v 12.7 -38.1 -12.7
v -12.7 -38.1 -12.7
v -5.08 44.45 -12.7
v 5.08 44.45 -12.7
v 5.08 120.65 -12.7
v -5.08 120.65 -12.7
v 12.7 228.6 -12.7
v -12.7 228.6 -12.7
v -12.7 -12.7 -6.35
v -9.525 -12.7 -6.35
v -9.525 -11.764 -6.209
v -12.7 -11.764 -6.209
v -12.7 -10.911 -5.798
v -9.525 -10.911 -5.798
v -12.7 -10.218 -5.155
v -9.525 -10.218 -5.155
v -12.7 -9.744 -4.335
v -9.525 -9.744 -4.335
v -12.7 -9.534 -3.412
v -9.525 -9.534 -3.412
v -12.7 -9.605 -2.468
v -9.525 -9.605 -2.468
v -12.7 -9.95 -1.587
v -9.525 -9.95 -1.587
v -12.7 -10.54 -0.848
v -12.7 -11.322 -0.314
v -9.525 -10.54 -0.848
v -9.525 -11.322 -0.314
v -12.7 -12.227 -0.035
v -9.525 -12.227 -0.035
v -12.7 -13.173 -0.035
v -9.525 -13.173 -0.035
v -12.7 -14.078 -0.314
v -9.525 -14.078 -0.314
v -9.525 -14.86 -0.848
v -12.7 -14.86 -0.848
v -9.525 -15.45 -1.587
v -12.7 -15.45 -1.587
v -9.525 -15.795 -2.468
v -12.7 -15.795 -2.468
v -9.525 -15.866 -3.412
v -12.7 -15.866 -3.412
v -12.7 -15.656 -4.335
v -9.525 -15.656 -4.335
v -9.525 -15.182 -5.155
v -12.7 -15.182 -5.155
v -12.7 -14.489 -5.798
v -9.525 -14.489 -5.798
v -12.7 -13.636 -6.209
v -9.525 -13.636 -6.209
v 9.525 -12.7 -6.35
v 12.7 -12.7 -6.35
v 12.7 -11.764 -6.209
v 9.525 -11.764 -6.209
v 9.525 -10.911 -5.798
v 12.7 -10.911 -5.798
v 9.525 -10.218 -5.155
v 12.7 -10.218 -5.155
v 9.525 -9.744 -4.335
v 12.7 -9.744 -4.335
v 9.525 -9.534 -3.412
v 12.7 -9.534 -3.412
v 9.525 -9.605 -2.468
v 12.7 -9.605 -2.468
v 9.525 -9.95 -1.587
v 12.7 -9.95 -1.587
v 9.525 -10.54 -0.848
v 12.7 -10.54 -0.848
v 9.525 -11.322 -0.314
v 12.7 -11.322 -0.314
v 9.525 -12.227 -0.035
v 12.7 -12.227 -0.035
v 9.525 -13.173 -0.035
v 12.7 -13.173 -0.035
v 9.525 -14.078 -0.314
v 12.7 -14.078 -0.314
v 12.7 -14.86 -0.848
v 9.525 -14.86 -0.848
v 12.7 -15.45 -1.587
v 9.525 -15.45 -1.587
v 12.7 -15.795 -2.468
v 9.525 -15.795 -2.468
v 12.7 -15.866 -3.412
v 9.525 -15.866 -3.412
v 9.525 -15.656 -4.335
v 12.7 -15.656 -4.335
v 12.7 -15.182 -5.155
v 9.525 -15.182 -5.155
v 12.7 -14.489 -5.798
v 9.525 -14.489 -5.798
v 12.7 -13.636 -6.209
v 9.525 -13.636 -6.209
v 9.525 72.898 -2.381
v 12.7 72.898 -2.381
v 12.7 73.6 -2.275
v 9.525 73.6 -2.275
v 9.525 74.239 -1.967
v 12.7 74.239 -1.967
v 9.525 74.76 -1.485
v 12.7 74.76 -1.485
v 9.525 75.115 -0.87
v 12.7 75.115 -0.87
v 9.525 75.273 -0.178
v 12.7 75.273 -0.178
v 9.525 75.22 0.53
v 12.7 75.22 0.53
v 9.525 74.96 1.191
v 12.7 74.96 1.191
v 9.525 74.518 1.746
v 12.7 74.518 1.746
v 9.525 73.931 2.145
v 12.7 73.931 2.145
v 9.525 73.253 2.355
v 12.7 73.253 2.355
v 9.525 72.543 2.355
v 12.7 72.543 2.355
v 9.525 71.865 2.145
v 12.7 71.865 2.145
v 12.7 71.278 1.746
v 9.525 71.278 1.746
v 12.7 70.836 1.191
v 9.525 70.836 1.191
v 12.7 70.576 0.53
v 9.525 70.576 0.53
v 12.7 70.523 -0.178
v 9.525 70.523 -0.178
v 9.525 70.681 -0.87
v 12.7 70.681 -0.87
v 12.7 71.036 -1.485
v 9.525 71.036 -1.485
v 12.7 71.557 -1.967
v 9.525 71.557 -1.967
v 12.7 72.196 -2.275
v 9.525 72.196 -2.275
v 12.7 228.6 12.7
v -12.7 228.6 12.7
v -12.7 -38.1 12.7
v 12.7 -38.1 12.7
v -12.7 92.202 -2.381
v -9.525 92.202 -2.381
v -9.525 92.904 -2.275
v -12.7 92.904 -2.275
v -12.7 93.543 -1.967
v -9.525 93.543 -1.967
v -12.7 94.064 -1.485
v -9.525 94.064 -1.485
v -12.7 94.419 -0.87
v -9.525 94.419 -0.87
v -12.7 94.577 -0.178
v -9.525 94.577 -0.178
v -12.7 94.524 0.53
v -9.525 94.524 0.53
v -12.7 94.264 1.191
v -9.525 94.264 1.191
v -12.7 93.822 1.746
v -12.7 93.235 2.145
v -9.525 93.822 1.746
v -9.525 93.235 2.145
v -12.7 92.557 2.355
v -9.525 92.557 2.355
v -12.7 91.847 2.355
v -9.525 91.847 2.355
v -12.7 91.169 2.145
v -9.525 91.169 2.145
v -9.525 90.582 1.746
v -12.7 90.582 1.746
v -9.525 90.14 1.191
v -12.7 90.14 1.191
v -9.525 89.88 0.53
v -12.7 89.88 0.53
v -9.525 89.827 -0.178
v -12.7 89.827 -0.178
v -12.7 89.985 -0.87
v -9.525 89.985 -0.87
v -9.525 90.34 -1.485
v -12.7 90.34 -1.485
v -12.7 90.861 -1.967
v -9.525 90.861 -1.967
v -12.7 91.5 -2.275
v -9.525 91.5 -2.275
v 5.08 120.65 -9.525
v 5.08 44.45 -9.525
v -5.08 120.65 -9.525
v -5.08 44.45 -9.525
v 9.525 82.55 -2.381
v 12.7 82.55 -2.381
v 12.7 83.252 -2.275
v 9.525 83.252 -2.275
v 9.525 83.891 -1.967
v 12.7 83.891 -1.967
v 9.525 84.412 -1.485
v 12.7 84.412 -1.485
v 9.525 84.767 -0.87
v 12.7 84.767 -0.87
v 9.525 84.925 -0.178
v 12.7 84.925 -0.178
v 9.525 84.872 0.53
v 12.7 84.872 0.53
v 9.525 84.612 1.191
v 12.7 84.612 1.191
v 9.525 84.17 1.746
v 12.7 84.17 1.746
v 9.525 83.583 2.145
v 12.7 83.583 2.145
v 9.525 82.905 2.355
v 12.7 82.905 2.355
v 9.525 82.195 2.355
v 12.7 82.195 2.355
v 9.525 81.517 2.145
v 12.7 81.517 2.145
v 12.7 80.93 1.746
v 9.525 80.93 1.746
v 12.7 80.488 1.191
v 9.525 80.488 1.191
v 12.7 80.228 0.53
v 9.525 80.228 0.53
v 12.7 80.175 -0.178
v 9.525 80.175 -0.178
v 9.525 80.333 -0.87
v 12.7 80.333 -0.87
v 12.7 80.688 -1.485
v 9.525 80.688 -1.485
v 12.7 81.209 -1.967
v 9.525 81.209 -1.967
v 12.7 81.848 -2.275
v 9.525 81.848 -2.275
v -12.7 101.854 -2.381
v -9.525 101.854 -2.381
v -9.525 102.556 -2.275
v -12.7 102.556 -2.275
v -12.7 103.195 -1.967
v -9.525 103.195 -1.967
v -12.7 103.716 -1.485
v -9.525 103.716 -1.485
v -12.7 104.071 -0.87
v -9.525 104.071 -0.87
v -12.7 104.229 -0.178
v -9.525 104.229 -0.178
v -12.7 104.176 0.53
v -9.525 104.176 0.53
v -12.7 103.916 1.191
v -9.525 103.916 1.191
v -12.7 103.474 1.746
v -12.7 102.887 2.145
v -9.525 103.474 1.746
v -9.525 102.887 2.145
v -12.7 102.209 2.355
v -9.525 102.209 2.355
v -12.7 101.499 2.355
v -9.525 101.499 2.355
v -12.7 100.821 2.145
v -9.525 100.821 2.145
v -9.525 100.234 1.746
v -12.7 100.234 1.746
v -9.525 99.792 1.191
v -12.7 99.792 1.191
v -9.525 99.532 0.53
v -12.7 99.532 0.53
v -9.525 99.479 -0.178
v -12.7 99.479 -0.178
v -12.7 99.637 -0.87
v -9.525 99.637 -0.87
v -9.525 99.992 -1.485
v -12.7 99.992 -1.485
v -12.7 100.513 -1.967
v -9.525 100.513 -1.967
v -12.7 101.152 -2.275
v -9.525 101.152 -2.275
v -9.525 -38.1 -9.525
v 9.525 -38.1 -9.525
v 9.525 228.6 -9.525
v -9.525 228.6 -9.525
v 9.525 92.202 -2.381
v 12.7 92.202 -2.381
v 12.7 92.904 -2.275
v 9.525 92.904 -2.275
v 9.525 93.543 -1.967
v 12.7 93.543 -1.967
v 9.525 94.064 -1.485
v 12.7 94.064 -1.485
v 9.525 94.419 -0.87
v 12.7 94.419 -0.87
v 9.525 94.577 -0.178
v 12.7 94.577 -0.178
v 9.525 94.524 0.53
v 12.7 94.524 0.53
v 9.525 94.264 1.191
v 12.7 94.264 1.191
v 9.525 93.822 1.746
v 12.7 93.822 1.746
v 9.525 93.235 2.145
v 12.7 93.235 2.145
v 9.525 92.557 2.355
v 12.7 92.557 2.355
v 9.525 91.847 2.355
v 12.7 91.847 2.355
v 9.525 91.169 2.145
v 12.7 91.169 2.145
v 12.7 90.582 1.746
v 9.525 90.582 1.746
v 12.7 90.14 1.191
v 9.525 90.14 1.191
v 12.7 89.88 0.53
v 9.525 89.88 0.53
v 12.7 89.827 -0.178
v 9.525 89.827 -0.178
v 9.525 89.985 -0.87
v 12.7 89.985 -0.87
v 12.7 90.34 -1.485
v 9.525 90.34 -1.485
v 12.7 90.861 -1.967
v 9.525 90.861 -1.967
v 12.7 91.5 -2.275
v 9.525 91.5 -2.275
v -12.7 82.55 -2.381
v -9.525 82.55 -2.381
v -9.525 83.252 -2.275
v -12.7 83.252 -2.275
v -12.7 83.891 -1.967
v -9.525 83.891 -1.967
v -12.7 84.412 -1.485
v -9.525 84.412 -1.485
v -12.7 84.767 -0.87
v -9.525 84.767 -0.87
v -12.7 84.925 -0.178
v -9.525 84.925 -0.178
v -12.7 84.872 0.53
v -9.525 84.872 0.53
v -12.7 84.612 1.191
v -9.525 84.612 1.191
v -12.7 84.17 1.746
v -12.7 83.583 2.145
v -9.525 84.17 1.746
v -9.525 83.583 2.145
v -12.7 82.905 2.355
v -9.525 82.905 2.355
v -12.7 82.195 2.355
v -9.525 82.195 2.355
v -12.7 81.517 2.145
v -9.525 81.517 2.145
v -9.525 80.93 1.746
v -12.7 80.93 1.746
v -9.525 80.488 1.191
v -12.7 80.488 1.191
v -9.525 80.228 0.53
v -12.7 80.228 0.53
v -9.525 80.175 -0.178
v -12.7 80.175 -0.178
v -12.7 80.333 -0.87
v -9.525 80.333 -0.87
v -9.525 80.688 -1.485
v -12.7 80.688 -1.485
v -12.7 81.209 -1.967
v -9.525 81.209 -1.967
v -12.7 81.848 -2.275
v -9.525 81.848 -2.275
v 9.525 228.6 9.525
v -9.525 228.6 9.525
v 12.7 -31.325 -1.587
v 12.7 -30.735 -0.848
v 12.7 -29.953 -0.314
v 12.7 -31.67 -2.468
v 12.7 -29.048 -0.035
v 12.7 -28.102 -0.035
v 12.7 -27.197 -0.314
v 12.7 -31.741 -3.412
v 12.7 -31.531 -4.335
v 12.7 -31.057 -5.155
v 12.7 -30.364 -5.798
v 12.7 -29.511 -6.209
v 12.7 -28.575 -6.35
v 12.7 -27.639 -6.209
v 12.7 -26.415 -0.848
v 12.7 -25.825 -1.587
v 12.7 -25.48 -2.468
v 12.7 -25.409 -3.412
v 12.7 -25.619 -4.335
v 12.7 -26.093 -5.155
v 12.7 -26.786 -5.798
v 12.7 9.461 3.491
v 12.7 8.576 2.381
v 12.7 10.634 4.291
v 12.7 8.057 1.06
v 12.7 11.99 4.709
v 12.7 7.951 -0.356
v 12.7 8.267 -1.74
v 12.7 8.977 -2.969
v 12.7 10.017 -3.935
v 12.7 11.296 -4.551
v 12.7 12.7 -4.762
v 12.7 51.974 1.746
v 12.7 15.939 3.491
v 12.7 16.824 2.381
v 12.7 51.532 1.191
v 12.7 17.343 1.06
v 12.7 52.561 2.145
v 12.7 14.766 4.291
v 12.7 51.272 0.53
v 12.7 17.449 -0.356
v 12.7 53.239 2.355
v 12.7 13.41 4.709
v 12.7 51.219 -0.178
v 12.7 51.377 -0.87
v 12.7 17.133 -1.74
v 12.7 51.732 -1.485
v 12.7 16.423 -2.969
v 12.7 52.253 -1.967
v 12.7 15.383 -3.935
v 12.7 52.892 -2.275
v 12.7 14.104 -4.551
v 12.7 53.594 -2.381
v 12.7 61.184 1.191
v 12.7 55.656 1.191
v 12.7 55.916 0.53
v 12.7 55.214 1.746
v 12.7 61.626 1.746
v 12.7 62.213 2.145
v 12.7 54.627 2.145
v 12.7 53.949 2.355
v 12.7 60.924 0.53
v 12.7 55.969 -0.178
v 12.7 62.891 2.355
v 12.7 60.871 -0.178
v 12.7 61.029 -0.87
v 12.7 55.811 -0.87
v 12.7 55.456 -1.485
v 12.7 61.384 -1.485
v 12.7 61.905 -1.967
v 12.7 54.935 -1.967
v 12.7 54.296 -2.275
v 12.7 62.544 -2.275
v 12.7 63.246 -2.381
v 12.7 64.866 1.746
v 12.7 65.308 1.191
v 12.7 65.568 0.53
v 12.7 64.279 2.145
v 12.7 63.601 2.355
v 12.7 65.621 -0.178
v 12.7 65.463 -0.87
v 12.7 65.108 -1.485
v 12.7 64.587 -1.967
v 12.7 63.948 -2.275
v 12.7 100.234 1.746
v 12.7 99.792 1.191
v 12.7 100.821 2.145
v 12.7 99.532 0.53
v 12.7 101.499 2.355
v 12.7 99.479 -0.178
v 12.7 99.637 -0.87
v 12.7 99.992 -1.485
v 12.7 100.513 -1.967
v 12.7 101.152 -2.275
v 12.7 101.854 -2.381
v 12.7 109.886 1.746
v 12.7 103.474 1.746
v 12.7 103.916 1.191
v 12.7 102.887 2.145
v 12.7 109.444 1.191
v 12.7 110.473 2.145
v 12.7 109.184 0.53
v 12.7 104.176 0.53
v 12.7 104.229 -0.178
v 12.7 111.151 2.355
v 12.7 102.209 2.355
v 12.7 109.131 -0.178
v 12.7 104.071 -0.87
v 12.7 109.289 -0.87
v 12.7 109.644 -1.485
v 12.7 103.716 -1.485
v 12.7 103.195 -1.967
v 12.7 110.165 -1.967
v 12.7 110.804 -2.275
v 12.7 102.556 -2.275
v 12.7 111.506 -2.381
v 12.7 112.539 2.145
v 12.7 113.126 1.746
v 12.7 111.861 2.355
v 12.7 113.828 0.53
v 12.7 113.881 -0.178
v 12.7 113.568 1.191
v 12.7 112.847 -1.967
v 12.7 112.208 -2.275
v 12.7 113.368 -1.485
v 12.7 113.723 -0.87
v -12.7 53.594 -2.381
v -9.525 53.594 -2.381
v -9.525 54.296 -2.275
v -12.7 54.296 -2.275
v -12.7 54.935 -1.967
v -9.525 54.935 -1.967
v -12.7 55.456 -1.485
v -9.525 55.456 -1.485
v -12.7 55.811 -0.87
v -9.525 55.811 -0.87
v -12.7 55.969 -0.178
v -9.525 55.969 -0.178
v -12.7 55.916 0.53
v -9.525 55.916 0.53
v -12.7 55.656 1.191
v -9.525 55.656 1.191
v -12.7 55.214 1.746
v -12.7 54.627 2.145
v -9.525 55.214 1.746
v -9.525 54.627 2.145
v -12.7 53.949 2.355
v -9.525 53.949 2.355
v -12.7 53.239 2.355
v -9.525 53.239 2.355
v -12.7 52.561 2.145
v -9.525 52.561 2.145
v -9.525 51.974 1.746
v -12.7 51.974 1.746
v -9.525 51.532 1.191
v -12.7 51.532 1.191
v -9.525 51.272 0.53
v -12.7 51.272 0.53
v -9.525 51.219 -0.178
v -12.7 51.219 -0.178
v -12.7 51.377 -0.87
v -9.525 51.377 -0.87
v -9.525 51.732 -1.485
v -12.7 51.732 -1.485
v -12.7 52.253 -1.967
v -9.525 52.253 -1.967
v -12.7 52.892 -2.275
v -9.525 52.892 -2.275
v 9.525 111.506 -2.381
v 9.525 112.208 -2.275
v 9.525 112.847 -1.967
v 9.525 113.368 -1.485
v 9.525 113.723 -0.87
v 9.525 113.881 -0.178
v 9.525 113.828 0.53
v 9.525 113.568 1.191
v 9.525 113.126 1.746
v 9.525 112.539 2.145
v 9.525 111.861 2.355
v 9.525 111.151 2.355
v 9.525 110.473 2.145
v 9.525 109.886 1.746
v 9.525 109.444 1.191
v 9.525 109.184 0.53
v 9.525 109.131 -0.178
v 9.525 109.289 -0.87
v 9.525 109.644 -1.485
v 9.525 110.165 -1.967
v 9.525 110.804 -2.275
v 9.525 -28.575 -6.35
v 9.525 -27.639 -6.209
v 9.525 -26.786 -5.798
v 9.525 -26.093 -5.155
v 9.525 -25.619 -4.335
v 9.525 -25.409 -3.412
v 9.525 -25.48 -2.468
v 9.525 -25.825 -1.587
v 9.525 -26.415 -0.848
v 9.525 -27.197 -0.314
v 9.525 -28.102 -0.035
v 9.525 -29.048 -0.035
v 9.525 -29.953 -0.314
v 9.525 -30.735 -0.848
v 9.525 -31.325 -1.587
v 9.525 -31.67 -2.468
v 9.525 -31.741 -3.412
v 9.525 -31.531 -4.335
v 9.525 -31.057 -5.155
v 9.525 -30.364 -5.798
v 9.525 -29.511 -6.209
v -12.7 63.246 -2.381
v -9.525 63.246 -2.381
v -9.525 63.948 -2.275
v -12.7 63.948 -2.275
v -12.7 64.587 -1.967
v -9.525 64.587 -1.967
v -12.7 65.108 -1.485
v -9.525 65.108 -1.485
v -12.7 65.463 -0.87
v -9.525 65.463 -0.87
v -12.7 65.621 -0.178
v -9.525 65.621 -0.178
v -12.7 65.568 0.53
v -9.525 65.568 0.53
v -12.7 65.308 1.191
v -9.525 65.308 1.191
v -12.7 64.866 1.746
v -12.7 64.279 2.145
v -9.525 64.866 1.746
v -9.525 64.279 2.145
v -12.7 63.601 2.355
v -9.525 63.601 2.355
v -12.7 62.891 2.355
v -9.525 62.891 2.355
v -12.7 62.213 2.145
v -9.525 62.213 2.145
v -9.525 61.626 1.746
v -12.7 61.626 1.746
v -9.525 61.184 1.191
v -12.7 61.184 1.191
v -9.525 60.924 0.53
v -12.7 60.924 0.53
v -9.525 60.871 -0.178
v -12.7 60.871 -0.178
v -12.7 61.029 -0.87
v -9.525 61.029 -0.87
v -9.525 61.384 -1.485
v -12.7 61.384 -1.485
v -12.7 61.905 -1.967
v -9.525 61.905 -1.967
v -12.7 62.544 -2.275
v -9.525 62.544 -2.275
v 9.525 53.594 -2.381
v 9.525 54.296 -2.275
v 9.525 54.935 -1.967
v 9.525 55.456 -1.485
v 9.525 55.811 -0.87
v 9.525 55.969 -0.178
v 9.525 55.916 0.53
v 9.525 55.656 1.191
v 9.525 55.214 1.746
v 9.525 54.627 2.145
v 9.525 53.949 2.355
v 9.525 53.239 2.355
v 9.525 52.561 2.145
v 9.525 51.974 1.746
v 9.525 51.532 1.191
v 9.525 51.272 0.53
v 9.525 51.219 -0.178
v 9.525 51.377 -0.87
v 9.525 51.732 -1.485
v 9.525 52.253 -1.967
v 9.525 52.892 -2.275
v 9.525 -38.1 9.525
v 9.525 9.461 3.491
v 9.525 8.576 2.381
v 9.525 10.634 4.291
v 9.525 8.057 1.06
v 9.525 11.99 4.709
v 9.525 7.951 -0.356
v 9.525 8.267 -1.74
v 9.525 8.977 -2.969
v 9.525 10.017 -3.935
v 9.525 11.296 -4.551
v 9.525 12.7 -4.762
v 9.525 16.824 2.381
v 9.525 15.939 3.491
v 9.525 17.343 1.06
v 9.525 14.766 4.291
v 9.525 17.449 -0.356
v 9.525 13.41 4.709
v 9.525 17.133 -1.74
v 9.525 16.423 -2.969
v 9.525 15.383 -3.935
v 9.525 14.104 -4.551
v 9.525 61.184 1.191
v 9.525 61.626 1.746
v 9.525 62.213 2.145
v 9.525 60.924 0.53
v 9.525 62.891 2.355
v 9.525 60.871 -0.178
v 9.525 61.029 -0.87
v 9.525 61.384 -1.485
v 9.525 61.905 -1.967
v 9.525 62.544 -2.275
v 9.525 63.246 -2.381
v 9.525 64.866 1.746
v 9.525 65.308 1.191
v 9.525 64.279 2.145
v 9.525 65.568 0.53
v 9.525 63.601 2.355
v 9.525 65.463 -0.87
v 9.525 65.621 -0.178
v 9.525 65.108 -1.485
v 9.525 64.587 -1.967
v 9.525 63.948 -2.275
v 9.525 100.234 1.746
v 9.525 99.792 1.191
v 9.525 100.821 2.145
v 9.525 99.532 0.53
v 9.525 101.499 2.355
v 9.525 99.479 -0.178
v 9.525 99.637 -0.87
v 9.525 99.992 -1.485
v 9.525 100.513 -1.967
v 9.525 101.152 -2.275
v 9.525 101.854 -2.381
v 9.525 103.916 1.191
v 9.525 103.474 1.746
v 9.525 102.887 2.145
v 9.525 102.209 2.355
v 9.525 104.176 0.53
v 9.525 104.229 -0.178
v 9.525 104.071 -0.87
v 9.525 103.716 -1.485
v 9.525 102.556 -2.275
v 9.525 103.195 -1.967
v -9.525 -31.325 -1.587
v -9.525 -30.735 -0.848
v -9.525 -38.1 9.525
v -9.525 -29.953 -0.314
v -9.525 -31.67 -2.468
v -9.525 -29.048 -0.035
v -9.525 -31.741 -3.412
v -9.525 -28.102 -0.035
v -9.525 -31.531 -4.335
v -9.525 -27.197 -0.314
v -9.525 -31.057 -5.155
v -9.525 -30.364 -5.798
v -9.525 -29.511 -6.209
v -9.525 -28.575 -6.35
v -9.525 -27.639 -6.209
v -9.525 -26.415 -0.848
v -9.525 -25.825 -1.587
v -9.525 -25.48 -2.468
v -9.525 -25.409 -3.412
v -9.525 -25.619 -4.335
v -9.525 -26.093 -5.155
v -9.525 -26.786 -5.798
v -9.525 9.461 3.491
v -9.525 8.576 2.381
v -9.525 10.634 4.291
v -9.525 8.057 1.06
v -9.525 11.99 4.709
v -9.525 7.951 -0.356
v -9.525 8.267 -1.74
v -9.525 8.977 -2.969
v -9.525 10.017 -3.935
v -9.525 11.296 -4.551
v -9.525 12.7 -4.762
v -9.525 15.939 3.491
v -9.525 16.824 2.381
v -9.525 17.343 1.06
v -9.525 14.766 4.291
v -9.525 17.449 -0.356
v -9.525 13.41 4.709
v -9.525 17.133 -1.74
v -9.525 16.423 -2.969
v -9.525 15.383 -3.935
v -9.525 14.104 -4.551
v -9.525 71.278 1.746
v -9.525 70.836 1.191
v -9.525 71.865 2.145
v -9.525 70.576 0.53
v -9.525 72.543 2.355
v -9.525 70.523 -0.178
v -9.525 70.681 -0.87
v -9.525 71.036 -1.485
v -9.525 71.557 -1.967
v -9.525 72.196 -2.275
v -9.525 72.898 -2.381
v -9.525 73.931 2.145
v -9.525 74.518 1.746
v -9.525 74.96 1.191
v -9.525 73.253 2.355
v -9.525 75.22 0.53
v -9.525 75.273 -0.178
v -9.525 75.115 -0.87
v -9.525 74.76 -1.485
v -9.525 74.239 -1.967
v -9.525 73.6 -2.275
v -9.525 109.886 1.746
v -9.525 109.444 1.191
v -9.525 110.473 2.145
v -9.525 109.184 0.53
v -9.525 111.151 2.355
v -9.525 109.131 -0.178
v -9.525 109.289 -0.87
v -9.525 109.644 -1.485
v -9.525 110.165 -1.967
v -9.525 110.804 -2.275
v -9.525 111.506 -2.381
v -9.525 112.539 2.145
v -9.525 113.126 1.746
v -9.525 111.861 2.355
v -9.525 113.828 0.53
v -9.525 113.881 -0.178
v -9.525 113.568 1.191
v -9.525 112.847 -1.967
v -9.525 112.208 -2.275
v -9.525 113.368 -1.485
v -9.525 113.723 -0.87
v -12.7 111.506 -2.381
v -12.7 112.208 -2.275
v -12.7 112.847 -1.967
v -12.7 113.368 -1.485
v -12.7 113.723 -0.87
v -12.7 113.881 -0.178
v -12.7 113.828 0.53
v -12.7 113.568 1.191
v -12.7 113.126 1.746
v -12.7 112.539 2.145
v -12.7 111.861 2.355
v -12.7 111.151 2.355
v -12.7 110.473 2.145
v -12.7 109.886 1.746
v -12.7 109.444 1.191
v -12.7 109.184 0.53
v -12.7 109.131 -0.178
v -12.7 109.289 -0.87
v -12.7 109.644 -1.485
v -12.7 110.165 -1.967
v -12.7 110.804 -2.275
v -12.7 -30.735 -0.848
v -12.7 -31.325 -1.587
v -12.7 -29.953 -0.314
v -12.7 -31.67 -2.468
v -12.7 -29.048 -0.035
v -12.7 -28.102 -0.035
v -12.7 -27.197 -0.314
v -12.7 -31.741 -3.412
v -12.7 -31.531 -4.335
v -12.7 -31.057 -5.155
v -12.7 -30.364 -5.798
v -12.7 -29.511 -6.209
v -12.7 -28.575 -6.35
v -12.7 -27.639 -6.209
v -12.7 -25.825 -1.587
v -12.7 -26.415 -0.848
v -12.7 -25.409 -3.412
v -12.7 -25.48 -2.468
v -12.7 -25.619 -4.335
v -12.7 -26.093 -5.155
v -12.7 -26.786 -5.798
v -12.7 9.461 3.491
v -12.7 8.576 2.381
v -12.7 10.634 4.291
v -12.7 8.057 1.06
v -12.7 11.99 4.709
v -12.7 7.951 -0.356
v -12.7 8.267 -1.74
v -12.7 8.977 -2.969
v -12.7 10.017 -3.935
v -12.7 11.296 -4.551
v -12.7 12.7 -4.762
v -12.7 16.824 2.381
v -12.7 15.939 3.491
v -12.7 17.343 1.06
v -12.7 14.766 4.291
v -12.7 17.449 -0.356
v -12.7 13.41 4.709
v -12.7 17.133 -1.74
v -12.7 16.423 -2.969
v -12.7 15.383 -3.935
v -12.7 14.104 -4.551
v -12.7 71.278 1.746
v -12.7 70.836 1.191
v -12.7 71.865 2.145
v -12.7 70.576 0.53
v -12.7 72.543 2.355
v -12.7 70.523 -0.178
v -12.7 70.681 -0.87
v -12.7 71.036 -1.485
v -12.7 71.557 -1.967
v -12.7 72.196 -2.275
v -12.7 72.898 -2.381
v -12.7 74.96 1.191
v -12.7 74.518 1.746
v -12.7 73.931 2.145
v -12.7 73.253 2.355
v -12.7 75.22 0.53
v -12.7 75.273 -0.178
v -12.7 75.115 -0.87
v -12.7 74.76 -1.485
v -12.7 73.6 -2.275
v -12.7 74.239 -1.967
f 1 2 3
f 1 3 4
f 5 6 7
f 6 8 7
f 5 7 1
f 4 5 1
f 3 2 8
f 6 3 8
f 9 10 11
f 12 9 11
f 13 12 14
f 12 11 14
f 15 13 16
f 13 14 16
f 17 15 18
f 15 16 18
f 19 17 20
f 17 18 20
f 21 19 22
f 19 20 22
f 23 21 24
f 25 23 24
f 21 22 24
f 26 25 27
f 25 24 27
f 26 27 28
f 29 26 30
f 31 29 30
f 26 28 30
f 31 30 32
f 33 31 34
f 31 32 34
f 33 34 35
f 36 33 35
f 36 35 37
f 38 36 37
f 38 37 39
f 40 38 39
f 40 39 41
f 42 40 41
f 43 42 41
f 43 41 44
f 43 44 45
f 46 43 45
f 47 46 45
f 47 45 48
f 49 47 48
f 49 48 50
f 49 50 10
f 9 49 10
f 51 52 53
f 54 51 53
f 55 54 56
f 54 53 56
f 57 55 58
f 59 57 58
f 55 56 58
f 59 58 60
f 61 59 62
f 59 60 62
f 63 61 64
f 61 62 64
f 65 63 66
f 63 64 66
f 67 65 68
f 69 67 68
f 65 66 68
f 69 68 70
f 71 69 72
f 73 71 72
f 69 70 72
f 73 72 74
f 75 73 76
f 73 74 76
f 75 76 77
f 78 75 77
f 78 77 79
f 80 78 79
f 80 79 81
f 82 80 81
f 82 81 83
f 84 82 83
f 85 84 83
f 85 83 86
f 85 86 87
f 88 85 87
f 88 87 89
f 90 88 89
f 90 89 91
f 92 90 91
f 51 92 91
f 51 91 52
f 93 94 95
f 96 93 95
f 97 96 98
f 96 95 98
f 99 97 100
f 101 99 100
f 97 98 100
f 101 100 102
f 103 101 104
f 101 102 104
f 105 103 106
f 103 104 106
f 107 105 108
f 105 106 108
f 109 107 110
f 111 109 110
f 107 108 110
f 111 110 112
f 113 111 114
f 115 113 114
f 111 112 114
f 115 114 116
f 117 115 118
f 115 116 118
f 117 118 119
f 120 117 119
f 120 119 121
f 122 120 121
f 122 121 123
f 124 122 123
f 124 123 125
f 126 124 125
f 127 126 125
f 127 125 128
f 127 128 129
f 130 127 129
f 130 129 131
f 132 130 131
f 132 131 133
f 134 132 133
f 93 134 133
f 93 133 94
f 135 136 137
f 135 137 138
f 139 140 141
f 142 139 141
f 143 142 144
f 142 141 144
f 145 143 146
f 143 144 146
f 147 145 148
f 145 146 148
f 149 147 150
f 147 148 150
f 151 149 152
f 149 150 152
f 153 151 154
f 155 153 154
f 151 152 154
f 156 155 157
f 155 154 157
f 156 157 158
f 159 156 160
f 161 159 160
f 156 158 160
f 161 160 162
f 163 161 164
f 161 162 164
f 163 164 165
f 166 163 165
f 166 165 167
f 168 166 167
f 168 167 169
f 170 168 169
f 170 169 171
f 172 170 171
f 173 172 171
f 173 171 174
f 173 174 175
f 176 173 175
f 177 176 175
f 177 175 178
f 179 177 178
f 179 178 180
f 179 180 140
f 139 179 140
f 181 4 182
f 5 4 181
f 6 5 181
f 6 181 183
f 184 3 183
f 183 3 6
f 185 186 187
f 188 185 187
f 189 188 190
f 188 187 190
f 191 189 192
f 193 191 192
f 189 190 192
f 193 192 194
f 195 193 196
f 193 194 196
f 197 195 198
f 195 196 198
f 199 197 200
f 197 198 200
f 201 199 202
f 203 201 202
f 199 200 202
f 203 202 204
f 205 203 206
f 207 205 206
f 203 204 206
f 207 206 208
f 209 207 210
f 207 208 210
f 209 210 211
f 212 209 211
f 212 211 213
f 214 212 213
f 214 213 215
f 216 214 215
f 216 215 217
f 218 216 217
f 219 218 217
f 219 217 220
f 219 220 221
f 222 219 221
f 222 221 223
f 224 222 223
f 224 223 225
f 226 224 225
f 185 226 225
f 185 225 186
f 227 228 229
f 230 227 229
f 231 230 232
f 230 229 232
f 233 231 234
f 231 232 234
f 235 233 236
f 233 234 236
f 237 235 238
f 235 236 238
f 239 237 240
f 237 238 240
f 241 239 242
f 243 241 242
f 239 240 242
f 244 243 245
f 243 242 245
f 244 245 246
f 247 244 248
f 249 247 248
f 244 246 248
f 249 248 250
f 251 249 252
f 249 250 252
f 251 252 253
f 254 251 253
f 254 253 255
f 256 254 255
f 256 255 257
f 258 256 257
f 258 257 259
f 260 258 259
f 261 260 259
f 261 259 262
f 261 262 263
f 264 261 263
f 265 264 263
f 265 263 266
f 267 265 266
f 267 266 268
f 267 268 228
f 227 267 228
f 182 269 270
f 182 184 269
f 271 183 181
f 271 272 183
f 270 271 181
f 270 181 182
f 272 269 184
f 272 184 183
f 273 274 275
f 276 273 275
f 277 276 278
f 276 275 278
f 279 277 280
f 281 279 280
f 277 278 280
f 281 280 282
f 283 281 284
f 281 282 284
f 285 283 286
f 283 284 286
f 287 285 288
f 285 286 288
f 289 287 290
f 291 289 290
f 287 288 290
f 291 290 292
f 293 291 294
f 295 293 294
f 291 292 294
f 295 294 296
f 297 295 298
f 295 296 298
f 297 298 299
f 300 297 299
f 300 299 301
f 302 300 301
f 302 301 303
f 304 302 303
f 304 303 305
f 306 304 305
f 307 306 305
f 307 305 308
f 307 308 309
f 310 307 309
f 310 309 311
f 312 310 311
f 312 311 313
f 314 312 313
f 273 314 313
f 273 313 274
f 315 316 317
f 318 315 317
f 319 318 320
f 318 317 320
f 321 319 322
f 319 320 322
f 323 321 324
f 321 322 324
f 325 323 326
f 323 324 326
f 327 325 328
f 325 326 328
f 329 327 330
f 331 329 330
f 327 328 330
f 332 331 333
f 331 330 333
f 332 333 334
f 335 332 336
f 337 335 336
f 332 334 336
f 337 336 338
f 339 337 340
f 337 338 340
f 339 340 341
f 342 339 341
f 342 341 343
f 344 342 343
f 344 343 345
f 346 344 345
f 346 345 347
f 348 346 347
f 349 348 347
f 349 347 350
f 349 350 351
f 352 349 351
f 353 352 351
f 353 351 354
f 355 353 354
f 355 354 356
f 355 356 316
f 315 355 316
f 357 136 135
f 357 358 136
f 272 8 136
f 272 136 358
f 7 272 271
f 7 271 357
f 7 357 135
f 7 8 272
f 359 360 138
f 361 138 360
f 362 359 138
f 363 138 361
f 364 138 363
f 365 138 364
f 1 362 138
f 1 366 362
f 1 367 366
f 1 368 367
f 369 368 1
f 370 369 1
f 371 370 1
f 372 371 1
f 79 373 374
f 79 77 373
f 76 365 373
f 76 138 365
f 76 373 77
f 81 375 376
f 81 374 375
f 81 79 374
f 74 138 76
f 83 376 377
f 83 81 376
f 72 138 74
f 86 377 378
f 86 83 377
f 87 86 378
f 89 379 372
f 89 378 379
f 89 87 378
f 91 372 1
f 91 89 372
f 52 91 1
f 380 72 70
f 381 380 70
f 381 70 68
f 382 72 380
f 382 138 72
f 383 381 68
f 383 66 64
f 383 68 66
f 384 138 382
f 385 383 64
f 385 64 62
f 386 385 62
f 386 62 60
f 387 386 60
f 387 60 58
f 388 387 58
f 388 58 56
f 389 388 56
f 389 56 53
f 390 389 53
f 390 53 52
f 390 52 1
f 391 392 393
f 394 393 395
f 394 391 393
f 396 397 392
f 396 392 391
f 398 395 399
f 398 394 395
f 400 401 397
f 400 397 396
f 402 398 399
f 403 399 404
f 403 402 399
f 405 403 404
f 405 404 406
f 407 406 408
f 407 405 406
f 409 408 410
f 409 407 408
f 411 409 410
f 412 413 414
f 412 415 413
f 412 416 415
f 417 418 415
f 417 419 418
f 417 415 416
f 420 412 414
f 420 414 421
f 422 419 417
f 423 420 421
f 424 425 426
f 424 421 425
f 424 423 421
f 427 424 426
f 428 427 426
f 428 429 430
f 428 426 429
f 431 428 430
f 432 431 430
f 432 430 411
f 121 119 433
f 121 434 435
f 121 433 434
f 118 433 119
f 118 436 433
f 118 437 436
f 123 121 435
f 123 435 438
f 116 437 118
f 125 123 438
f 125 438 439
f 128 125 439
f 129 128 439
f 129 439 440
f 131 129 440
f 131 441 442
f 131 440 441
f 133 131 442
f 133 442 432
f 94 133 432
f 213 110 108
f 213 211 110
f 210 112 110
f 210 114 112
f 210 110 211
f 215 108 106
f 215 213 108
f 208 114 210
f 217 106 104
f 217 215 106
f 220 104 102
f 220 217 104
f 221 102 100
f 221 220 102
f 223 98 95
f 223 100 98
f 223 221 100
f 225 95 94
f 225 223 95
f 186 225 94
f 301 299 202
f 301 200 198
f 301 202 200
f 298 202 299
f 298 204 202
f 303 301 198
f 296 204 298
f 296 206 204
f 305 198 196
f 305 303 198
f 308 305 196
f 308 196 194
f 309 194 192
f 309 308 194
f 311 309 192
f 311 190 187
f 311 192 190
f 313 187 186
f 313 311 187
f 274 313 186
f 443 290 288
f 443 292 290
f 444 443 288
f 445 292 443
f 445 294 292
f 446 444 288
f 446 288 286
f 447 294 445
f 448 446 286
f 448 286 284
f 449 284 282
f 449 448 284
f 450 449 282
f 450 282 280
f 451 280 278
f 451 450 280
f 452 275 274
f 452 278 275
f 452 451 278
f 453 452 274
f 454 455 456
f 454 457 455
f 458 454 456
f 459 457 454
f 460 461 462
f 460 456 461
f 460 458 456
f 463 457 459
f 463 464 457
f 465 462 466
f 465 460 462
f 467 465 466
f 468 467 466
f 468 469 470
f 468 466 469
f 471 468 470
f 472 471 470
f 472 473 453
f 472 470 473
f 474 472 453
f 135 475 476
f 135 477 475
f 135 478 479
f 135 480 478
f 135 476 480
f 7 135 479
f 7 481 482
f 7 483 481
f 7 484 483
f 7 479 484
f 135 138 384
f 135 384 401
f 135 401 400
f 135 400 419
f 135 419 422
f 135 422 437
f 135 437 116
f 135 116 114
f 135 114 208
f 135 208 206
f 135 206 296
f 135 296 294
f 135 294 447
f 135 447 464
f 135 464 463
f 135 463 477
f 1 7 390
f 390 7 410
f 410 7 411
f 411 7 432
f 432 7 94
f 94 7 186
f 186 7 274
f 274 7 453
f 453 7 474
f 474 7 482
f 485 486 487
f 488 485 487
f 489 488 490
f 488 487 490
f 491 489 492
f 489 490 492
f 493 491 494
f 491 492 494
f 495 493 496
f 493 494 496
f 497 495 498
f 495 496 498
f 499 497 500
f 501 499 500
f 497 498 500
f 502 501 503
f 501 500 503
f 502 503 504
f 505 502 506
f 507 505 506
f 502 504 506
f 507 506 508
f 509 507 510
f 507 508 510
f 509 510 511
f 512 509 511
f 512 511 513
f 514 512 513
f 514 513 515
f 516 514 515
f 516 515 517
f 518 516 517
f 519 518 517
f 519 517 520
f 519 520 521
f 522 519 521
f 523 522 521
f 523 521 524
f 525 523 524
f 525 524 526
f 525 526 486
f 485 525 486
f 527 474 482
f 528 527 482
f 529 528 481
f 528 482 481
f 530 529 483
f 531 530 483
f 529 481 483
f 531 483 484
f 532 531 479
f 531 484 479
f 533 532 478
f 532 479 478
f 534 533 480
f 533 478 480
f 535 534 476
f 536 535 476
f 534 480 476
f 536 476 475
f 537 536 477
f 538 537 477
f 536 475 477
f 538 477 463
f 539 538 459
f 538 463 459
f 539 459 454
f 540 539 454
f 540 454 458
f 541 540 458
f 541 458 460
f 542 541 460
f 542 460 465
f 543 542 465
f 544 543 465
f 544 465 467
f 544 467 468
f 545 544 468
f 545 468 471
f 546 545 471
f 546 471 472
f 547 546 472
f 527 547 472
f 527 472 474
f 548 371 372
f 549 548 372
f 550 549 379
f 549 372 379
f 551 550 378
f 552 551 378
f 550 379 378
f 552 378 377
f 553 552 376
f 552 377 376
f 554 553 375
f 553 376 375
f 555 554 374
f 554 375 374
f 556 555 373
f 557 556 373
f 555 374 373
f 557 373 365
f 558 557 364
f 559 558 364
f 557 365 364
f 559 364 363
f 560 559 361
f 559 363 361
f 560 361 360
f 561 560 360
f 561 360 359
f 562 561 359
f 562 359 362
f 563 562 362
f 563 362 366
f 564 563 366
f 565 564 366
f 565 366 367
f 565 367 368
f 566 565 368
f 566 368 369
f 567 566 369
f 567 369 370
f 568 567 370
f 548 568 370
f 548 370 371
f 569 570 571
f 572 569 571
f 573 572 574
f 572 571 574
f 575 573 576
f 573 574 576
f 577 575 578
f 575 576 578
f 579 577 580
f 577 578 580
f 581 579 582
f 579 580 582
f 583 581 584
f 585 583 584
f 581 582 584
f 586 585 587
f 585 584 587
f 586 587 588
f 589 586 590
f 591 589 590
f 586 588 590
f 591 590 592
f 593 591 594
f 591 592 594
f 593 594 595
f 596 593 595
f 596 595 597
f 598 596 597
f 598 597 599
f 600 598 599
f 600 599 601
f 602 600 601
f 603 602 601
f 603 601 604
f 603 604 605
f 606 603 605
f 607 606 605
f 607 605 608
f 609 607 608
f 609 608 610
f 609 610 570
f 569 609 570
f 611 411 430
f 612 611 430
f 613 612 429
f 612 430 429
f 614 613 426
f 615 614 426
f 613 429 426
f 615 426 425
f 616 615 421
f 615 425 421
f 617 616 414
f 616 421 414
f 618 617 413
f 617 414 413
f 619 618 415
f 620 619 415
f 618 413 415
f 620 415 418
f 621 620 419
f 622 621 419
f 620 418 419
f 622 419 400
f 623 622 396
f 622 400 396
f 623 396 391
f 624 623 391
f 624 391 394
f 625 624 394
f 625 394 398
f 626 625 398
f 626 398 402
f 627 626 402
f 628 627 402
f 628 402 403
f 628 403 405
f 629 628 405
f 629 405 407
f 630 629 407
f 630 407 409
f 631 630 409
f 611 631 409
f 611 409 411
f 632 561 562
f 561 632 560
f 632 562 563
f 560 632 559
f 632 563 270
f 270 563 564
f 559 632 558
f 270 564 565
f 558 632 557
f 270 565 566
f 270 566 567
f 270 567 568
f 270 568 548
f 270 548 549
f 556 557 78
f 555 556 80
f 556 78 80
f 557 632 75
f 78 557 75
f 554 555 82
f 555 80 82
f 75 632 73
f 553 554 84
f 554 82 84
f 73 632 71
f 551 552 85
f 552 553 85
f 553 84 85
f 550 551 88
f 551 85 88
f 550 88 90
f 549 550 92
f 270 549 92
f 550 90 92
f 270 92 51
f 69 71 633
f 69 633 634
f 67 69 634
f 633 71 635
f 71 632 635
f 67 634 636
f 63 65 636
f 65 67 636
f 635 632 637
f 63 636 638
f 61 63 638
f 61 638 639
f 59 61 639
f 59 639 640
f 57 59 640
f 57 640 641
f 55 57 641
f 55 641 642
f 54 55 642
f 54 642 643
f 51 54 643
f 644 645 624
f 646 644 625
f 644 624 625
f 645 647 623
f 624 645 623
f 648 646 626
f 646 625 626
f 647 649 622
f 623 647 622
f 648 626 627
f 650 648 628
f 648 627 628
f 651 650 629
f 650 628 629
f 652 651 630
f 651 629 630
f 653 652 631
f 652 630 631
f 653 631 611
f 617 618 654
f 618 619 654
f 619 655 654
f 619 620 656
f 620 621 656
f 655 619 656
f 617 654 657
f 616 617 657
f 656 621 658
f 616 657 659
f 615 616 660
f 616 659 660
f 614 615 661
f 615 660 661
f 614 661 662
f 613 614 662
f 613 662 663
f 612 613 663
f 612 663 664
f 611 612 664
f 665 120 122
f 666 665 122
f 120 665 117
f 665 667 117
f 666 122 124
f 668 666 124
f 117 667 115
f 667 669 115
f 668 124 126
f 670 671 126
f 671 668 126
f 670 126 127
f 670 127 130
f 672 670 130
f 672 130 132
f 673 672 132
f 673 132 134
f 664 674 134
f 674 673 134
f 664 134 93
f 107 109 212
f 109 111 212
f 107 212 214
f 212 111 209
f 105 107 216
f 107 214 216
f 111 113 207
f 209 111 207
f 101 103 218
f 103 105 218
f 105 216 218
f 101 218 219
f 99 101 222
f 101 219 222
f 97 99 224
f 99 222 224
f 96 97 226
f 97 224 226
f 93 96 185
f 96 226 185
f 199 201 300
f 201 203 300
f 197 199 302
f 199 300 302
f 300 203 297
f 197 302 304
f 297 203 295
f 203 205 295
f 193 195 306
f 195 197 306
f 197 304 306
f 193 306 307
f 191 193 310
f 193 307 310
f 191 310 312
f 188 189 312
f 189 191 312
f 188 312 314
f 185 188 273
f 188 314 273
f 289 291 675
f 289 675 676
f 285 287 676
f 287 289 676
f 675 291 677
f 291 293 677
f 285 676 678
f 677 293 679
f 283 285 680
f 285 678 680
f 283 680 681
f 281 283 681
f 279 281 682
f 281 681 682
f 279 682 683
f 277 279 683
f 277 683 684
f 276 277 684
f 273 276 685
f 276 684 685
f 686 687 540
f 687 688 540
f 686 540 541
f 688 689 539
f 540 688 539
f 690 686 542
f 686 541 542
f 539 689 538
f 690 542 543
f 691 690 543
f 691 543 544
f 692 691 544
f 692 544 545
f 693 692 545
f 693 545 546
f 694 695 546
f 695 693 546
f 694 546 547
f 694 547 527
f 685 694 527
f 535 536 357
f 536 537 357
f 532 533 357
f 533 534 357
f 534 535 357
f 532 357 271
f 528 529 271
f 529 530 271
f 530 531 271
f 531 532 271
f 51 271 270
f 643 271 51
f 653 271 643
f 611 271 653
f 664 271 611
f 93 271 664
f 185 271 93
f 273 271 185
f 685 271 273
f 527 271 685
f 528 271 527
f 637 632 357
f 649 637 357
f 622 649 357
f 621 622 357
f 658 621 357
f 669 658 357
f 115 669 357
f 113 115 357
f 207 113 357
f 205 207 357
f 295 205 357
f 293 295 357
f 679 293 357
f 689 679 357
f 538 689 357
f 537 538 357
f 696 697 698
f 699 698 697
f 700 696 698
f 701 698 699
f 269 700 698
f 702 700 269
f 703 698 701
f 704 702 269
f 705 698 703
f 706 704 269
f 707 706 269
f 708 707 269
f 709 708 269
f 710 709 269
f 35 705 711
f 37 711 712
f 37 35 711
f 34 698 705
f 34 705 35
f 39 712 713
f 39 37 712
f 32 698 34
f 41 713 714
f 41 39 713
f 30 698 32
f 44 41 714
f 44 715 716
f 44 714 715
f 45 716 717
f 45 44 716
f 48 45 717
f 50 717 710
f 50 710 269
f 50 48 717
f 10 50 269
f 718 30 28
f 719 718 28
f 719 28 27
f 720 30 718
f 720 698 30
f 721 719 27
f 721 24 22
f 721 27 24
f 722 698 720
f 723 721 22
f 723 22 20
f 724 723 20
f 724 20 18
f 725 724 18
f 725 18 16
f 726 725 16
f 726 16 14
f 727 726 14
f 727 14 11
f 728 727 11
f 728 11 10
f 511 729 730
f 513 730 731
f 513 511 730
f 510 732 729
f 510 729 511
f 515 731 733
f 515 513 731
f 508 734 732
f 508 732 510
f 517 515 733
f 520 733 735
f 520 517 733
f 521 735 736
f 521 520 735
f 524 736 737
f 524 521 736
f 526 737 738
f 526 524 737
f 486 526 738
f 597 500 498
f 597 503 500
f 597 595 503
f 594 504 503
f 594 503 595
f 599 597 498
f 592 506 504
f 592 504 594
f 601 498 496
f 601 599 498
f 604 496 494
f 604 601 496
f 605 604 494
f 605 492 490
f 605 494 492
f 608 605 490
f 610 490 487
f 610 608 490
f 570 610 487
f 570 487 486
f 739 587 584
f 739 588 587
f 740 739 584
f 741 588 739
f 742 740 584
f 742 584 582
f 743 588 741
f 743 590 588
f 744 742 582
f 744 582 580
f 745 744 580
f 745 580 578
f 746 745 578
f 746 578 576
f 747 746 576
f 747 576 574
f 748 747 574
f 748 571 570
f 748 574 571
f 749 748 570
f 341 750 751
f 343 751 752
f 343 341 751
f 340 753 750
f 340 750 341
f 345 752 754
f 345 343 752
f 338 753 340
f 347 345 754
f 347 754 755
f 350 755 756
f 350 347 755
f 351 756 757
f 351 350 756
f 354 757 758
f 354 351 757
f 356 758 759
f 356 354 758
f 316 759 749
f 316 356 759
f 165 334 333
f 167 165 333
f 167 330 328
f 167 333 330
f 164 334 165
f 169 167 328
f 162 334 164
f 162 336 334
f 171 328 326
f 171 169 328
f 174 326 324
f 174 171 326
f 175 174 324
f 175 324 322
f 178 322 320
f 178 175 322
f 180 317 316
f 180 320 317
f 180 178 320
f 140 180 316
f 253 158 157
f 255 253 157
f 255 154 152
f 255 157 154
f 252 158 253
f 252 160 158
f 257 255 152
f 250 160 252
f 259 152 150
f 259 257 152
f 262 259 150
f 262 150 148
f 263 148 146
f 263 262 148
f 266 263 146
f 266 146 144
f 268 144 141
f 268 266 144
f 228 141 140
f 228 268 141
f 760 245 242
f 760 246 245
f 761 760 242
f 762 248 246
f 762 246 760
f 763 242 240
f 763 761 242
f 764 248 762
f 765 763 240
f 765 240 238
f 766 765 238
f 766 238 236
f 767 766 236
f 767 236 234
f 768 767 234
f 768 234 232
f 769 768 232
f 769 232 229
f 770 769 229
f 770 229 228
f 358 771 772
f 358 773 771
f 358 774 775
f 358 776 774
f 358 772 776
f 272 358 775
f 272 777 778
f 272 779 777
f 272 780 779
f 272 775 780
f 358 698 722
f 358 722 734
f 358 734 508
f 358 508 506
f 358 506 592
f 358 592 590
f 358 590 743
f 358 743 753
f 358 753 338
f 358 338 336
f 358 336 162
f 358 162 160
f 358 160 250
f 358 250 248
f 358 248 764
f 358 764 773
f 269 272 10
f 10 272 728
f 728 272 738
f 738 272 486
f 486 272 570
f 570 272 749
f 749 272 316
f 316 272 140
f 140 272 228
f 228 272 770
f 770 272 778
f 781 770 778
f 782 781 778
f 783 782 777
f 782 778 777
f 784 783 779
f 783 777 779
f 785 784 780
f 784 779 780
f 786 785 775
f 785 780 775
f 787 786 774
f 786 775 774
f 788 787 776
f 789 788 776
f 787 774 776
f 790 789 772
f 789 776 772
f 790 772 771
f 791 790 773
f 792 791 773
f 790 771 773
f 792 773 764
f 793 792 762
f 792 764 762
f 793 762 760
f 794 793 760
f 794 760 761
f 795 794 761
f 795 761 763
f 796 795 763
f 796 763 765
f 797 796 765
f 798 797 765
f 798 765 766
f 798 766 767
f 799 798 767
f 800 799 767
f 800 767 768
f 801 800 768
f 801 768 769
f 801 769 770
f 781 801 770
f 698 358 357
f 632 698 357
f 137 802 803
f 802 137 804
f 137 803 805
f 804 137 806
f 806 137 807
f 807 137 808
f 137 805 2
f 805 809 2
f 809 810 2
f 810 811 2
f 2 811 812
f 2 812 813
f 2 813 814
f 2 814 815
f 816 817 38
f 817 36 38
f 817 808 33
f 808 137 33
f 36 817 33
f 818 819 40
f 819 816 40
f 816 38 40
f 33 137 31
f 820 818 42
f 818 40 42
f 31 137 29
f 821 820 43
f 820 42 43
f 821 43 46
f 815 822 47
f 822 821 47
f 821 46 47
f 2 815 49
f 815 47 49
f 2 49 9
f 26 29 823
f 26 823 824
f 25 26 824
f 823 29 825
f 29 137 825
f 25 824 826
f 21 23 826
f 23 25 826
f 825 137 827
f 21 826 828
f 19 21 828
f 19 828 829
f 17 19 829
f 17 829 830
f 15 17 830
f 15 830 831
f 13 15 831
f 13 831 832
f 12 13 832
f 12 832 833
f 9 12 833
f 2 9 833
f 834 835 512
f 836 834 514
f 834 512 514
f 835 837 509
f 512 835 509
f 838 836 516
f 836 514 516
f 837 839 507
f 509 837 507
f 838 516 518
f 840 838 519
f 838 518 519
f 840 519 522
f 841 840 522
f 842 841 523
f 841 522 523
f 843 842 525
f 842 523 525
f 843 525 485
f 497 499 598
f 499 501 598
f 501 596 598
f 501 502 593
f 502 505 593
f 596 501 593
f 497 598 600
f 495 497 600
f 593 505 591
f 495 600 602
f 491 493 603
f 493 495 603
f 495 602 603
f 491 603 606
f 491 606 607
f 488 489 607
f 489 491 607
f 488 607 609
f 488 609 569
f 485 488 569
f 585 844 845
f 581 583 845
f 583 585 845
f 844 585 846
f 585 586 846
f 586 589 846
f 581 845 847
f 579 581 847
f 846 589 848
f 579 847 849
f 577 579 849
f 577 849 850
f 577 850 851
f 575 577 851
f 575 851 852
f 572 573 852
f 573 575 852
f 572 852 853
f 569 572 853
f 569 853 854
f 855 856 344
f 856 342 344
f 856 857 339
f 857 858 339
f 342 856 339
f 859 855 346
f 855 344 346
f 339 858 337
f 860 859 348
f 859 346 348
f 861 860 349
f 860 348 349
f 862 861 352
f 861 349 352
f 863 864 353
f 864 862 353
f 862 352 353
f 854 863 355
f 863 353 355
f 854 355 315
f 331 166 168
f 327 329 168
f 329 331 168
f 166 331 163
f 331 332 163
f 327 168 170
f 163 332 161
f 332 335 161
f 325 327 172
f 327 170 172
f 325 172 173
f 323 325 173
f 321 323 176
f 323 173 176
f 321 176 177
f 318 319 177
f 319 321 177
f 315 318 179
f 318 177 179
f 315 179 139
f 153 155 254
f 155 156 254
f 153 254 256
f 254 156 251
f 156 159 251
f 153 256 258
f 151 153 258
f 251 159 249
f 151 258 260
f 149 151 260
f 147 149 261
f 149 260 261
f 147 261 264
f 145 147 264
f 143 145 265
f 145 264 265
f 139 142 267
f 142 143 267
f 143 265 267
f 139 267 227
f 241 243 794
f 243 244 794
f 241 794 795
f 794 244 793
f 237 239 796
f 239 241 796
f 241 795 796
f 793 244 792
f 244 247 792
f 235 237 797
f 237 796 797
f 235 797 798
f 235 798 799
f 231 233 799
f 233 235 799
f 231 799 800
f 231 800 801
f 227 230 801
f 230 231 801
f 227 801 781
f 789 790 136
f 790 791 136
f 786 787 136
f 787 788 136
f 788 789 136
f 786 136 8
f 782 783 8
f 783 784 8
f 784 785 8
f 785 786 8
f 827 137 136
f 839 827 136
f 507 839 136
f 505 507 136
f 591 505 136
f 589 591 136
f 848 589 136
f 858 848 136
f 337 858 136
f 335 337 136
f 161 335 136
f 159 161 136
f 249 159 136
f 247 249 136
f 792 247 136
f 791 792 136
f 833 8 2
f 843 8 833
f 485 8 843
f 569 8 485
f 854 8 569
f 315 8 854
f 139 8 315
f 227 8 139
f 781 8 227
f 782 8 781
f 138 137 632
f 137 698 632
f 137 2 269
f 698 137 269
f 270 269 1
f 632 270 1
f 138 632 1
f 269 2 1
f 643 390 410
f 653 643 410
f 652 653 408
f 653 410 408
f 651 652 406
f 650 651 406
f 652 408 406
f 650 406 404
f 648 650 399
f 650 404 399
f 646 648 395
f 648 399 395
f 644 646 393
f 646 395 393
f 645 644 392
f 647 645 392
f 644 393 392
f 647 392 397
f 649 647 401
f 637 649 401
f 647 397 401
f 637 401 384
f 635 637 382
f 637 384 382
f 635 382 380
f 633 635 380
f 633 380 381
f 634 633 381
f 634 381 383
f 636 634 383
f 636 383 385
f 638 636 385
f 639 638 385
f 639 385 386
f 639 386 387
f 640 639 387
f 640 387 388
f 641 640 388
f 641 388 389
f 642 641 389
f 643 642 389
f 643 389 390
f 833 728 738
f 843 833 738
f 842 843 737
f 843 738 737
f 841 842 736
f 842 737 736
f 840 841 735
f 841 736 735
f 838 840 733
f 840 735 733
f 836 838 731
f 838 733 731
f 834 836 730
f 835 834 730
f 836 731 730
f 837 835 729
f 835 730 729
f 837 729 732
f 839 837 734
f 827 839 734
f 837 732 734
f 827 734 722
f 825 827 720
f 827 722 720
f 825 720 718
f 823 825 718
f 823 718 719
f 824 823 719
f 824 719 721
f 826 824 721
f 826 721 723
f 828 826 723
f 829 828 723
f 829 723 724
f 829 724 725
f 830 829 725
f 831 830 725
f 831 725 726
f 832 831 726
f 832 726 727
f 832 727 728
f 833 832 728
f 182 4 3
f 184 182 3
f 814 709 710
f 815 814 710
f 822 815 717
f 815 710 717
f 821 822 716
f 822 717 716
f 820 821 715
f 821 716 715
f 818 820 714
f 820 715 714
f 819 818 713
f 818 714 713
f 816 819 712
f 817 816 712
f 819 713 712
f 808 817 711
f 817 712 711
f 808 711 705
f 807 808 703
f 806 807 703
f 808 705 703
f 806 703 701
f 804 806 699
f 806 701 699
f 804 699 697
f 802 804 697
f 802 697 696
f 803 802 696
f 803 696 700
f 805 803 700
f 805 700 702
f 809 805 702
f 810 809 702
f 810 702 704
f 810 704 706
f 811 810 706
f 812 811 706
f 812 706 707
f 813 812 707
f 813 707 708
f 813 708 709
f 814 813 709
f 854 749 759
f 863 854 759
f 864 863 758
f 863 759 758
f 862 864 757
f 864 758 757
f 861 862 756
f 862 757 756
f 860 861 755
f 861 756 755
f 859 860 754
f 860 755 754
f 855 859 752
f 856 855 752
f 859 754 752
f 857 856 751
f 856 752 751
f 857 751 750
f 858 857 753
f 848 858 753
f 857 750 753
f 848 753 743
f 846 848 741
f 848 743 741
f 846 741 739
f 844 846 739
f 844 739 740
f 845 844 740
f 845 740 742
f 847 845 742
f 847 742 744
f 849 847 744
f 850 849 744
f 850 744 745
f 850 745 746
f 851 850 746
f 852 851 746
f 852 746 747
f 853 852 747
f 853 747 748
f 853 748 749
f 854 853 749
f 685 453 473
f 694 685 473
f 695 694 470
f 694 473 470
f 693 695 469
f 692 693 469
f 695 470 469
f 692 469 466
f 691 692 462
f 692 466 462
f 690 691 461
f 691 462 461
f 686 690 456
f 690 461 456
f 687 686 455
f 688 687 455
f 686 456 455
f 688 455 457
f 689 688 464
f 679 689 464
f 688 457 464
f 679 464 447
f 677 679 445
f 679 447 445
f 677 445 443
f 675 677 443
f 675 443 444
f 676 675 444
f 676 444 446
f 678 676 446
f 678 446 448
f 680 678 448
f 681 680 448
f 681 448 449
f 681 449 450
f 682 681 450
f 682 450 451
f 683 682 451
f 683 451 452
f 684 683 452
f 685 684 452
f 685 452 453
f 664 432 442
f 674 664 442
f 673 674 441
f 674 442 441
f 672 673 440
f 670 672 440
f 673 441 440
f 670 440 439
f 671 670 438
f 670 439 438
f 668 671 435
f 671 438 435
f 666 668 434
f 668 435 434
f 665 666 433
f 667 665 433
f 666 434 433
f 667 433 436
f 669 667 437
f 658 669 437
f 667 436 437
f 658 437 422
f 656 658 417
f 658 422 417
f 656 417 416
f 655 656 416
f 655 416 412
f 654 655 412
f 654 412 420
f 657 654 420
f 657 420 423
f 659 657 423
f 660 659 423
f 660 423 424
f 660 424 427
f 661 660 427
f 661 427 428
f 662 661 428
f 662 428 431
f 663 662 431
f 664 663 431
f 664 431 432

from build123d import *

# Parameters (mm, degrees)
SKETCH1_W                = 25.4
SKETCH1_H                = 25.4
SKETCH1_W_2              = 19.05
SKETCH1_H_2              = 19.05
BOSS_EXTRUDE1_DEPTH      = 228.6
BOSS_EXTRUDE1_DEPTH_BACK = 38.1
CUT_EXTRUDE2_REACH       = 27.4
SKETCH3_W                = 10.16
SKETCH3_H                = 76.2
SKETCH4_R                = 3.175
SKETCH4_R_2              = 2.38125
SKETCH4_R_3              = 4.7625
CUT_EXTRUDE3_DEPTH       = 26.4


with BuildPart() as part:
    # Sketch1 → Boss-Extrude1 (new body, two sides)
    with BuildSketch(Plane(origin=(0, 0, 0), x_dir=(1, 0, 0), z_dir=(0, 1, 0))) as boss_extrude1_sk:
        Rectangle(SKETCH1_W, SKETCH1_H)
        Rectangle(SKETCH1_W_2, SKETCH1_H_2, mode=Mode.SUBTRACT)
    extrude(amount=BOSS_EXTRUDE1_DEPTH)
    extrude(boss_extrude1_sk.sketch, amount=-BOSS_EXTRUDE1_DEPTH_BACK)

    # Sketch3 → Cut-Extrude2 (cut, up to next)
    with BuildSketch(Plane(origin=(0, 0, -12.7), x_dir=(-1, 0, 0), z_dir=(0, 0, -1)), mode=Mode.PRIVATE) as cut_extrude2_sk1:
        with Locations((0, 82.55)):
            Rectangle(SKETCH3_W, SKETCH3_H)
    cut_extrude2_tool1 = extrude(cut_extrude2_sk1.sketch, amount=-CUT_EXTRUDE2_REACH, mode=Mode.PRIVATE) & part.part
    add(cut_extrude2_tool1.solids().sort_by_distance((0, 82.55, -12.7))[0], mode=Mode.SUBTRACT)

    # Sketch4 → Cut-Extrude3 (cut, through all)
    with BuildSketch(Plane(origin=(12.7, 0, 0), x_dir=(0, 0, -1), z_dir=(1, 0, 0))):
        with Locations((3.175, -28.575)):
            Circle(SKETCH4_R)
        with Locations((3.175, -12.7)):
            Circle(SKETCH4_R)
        with Locations((0, 63.246)):
            Circle(SKETCH4_R_2)
        with Locations((0, 72.898)):
            Circle(SKETCH4_R_2)
        with Locations((0, 82.55)):
            Circle(SKETCH4_R_2)
        with Locations((0, 101.854)):
            Circle(SKETCH4_R_2)
        with Locations((0, 111.506)):
            Circle(SKETCH4_R_2)
        with Locations((0, 12.7)):
            Circle(SKETCH4_R_3)
        with Locations((0, 53.594)):
            Circle(SKETCH4_R_2)
        with Locations((0, 92.202)):
            Circle(SKETCH4_R_2)
    extrude(amount=-CUT_EXTRUDE3_DEPTH, mode=Mode.SUBTRACT)


solid = part.part
